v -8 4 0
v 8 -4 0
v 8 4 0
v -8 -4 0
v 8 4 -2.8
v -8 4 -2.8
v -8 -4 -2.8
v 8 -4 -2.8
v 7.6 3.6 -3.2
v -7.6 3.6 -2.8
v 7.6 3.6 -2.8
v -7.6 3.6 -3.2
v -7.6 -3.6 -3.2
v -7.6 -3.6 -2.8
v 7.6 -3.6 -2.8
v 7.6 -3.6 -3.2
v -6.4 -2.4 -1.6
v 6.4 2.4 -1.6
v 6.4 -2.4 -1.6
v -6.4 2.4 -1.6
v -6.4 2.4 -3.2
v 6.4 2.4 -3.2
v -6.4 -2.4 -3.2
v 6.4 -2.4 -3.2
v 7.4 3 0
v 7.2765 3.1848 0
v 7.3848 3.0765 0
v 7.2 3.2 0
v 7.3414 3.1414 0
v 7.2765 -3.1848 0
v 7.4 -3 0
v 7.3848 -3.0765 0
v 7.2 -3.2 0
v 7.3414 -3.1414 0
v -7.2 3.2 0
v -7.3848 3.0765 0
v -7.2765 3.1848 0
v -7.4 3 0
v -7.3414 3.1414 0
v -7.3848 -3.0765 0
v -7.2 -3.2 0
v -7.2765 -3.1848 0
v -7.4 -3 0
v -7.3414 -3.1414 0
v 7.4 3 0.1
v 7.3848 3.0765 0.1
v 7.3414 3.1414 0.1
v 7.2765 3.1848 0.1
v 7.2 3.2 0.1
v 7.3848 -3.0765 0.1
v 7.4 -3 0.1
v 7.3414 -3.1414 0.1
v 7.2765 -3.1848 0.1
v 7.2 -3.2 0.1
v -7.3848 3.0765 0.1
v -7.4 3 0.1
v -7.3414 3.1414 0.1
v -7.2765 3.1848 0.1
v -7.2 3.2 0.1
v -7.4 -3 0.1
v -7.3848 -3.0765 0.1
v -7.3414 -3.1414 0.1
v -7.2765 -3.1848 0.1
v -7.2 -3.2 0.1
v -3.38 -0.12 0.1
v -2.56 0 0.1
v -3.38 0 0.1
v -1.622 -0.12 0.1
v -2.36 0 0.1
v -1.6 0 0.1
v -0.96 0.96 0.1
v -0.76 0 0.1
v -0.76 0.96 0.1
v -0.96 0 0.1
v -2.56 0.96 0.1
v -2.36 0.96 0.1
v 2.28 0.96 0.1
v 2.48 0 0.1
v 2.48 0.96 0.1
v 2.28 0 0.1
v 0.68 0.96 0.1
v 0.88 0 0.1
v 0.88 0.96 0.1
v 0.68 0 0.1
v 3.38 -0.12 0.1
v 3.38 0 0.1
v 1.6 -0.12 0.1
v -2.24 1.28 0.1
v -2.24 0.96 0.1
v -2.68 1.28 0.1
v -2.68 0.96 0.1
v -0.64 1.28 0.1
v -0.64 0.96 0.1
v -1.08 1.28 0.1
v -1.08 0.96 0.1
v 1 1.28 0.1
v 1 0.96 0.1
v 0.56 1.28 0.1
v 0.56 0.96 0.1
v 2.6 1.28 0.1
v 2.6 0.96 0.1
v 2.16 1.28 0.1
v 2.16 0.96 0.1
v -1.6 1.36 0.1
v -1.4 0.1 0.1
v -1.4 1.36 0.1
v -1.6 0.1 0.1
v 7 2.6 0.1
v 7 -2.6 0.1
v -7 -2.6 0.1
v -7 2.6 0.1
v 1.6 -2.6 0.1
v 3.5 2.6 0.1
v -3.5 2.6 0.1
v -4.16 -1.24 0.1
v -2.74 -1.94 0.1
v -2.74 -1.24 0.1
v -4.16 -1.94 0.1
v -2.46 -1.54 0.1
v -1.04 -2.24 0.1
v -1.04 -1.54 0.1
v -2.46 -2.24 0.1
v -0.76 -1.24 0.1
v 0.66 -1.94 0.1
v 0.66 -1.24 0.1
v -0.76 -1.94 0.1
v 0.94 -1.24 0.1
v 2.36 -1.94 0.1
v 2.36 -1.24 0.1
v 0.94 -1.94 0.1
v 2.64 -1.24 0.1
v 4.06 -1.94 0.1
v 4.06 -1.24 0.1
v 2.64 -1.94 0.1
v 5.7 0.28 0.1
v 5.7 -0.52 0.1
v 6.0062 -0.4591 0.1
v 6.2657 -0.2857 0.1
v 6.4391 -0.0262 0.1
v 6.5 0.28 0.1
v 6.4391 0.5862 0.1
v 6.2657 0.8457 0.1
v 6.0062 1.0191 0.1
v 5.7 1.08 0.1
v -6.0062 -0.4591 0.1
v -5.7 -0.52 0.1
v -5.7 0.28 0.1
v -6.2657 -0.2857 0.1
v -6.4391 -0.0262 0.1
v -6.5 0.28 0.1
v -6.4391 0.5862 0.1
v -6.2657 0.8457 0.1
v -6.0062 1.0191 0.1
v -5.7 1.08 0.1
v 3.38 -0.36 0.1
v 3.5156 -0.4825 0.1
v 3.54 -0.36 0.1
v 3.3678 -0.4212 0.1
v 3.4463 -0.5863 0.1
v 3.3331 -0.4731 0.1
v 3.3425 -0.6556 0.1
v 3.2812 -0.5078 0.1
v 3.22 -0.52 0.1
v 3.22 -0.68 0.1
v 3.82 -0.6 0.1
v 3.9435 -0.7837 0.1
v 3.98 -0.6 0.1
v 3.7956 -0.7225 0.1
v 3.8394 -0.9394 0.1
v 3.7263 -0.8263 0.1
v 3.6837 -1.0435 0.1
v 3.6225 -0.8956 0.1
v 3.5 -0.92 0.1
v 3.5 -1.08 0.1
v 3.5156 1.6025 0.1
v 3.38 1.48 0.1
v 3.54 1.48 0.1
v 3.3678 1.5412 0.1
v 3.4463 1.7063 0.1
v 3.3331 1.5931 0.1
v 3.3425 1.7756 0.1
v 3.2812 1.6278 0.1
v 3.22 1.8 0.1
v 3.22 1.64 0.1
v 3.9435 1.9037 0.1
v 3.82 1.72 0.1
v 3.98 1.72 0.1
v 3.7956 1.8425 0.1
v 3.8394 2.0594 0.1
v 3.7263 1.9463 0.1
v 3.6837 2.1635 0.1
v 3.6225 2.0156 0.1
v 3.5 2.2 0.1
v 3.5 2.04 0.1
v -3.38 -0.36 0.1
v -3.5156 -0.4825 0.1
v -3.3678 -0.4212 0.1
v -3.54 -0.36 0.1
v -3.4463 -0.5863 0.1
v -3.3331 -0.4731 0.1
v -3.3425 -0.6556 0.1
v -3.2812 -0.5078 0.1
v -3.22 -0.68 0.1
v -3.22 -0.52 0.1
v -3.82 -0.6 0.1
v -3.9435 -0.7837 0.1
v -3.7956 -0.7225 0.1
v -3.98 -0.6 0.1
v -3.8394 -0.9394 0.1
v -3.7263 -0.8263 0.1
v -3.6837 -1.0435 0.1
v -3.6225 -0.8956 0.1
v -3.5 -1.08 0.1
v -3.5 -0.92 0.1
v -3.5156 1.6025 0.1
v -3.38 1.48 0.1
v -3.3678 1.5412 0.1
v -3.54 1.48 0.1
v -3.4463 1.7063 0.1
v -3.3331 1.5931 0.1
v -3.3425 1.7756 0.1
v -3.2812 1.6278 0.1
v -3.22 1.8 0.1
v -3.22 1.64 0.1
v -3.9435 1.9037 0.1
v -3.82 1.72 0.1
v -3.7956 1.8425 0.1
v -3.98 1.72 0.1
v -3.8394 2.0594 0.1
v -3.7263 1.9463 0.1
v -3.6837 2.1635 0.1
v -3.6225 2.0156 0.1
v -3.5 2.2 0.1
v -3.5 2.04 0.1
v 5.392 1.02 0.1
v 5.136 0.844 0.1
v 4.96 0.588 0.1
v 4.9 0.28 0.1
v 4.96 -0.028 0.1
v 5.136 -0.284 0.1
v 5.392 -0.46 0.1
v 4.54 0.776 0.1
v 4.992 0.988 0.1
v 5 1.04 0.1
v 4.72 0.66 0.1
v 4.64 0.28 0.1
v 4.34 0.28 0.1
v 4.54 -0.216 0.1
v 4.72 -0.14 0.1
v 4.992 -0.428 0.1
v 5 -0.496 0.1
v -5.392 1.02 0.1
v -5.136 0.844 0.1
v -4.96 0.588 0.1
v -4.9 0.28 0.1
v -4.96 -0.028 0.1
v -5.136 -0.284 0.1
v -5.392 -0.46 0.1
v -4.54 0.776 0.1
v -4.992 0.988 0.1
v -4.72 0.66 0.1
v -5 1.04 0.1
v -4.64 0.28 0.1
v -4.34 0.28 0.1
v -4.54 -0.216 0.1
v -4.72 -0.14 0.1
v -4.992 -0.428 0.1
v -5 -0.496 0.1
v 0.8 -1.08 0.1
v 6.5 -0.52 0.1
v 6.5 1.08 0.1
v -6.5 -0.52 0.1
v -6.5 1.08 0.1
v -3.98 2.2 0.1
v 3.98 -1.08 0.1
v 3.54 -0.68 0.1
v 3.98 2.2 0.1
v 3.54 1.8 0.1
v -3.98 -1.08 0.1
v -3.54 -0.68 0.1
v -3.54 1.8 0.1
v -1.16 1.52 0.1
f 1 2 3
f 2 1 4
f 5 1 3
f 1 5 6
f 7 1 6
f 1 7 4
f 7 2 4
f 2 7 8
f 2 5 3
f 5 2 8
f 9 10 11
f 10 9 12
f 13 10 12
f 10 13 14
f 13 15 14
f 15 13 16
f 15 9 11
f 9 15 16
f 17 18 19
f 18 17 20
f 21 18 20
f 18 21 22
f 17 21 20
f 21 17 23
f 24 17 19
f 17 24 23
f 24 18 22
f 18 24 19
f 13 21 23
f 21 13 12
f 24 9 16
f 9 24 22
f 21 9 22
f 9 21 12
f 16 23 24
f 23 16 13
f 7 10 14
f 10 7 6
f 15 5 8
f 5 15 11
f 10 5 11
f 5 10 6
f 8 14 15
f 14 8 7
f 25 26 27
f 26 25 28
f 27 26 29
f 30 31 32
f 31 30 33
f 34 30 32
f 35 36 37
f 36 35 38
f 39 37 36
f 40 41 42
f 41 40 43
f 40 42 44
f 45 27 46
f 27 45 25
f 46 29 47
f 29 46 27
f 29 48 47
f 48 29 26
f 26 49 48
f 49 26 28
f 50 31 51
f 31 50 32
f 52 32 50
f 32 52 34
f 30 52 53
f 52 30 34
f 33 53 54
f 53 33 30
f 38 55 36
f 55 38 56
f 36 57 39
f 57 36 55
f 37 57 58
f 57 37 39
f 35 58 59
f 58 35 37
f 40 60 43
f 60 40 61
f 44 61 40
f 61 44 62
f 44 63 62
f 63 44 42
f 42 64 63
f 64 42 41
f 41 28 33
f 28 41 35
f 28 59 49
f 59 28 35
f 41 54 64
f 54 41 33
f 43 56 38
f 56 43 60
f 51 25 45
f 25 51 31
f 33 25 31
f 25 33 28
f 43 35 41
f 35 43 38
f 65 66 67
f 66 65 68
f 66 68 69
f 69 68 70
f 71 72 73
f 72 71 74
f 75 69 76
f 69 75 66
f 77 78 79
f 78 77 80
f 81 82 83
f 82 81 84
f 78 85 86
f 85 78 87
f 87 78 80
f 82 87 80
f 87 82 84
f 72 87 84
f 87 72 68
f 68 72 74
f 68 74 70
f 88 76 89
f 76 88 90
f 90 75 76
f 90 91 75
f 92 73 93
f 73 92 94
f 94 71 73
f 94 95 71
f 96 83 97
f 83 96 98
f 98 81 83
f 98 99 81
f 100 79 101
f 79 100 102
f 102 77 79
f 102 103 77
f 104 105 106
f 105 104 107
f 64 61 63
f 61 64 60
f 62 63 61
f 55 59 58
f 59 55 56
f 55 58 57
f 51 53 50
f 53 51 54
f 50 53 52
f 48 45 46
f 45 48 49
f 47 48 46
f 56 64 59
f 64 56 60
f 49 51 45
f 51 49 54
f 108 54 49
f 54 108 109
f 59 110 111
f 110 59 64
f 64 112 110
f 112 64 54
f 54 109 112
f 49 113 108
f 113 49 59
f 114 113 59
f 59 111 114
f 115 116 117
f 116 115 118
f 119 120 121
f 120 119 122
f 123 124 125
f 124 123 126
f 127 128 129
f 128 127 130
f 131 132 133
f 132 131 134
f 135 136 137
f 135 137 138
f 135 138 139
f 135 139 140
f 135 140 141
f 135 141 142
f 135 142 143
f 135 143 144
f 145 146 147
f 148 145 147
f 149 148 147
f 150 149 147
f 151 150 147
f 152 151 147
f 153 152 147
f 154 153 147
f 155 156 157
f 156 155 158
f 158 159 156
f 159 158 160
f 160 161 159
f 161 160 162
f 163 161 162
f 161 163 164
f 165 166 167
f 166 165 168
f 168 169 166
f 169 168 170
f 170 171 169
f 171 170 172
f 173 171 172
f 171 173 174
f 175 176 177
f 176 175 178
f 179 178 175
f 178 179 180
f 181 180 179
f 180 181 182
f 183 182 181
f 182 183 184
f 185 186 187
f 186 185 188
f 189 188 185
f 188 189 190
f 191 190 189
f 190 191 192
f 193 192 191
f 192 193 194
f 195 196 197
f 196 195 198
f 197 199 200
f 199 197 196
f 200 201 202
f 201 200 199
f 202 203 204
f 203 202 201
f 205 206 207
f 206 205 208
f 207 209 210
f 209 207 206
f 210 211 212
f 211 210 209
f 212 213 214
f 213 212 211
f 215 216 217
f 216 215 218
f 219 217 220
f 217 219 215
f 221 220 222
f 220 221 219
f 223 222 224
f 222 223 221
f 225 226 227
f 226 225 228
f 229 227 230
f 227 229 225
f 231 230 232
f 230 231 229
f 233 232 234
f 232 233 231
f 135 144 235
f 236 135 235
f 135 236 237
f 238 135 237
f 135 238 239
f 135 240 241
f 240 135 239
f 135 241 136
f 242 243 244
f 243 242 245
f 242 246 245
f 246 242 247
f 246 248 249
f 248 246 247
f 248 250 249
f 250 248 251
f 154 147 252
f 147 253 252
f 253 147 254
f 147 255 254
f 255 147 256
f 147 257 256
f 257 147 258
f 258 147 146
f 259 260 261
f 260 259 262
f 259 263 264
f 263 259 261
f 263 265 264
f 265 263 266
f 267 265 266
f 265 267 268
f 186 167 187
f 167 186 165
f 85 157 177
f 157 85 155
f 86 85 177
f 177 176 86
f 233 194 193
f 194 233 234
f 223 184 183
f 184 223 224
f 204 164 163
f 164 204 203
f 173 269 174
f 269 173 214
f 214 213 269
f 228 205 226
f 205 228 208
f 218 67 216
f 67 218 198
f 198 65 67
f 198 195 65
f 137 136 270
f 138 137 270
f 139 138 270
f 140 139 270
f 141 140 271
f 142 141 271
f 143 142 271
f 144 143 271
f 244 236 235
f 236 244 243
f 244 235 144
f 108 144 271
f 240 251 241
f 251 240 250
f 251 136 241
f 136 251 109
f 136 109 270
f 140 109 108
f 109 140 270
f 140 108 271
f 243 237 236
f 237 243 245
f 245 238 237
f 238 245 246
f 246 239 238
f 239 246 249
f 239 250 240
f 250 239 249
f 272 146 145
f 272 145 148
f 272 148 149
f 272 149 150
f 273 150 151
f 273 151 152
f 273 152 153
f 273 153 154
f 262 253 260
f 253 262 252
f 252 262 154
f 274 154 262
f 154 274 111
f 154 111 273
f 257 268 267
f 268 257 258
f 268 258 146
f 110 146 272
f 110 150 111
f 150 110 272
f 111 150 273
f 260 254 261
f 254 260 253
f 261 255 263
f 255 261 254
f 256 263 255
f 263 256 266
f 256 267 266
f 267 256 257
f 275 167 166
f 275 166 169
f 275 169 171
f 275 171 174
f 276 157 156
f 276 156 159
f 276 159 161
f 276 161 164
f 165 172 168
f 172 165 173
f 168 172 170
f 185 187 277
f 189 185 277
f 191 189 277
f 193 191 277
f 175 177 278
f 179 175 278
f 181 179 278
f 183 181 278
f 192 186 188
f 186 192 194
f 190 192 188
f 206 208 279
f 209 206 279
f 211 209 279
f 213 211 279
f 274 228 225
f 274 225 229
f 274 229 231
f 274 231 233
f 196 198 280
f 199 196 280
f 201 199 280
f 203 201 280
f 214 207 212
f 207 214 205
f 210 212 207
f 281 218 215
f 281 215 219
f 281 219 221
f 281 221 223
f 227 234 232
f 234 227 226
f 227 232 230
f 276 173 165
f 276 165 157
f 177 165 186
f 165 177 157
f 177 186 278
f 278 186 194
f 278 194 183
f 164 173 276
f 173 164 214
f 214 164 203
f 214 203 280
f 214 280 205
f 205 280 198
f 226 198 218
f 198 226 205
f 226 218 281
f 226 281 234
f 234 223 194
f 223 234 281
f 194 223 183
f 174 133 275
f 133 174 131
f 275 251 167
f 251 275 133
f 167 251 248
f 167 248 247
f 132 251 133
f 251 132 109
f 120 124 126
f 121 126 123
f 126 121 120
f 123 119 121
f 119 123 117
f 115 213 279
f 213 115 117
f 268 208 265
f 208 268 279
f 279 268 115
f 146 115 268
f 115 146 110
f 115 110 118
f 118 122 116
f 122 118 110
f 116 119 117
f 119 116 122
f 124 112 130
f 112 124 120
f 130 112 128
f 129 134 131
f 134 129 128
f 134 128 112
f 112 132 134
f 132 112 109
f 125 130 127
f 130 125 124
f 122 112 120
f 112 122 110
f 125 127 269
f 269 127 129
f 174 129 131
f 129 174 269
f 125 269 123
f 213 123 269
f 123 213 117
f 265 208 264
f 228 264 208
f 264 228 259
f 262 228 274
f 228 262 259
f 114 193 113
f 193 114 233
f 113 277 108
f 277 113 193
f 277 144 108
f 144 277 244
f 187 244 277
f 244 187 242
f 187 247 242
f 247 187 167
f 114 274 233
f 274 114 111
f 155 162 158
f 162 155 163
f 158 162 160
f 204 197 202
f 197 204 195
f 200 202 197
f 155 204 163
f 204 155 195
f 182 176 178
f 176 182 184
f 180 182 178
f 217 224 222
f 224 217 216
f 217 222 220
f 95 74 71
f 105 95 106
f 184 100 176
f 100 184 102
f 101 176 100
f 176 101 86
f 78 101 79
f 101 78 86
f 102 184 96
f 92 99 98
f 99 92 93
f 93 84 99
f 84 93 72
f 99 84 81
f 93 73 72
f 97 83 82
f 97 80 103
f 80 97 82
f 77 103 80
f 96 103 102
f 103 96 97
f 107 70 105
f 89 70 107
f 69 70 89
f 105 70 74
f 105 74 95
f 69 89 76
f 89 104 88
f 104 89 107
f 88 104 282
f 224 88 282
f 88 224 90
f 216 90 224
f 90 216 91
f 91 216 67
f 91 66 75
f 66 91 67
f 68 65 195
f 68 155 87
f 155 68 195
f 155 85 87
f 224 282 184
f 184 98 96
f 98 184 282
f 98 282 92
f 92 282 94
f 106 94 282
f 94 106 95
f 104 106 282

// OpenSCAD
use <../lib.scad>
use <3069b.scad>
use <6258203c.scad>
$fa=1; $fs=0.2;
function ldraw_lib__3069bd05(realsolid=false) = [
// 0 Tile  1 x  2 with Groove and Car Radio Sticker
// 0 Name: 3069bd05.dat
// 0 Author: Ulrich Röder [UR]
// 0 !LDRAW_ORG Shortcut UPDATE 2019-01
// 0 !LICENSE Licensed under CC BY 2.0 and CC BY 4.0 : see CAreadme.txt
// 
// 0 BFC CERTIFY CCW
  [0,"BFC","CERTIFY"],
  [0,"BFC","CCW"],
// 
// 0 !KEYWORDS Ford, Mustang, Set 10265
// 
// 0 !HISTORY 2019-06-28 [PTadmin] Official Update 2019-01
// 
// 
// 1 16 0 0 0 1 0 0 0 1 0 0 0 1 3069b.dat
  [1,16,0,0,0,1,0,0,0,1,0,0,0,1, ldraw_lib__3069b(realsolid)],
// 1 16 0 0 0 1 0 0 0 1 0 0 0 1 6258203c.dat
  [1,16,0,0,0,1,0,0,0,1,0,0,0,1, ldraw_lib__6258203c(realsolid)],
];
module ldraw_lib__3069bd05(step=0, col=false, unit=2/5, alt=false, line=0.2, solid=!$preview)
    makepoly(ldraw_lib__3069bd05(solid), step=step, col=col, unit=unit, alt=alt, line=line, solid=solid);
ldraw_lib__3069bd05(line=0.2);
